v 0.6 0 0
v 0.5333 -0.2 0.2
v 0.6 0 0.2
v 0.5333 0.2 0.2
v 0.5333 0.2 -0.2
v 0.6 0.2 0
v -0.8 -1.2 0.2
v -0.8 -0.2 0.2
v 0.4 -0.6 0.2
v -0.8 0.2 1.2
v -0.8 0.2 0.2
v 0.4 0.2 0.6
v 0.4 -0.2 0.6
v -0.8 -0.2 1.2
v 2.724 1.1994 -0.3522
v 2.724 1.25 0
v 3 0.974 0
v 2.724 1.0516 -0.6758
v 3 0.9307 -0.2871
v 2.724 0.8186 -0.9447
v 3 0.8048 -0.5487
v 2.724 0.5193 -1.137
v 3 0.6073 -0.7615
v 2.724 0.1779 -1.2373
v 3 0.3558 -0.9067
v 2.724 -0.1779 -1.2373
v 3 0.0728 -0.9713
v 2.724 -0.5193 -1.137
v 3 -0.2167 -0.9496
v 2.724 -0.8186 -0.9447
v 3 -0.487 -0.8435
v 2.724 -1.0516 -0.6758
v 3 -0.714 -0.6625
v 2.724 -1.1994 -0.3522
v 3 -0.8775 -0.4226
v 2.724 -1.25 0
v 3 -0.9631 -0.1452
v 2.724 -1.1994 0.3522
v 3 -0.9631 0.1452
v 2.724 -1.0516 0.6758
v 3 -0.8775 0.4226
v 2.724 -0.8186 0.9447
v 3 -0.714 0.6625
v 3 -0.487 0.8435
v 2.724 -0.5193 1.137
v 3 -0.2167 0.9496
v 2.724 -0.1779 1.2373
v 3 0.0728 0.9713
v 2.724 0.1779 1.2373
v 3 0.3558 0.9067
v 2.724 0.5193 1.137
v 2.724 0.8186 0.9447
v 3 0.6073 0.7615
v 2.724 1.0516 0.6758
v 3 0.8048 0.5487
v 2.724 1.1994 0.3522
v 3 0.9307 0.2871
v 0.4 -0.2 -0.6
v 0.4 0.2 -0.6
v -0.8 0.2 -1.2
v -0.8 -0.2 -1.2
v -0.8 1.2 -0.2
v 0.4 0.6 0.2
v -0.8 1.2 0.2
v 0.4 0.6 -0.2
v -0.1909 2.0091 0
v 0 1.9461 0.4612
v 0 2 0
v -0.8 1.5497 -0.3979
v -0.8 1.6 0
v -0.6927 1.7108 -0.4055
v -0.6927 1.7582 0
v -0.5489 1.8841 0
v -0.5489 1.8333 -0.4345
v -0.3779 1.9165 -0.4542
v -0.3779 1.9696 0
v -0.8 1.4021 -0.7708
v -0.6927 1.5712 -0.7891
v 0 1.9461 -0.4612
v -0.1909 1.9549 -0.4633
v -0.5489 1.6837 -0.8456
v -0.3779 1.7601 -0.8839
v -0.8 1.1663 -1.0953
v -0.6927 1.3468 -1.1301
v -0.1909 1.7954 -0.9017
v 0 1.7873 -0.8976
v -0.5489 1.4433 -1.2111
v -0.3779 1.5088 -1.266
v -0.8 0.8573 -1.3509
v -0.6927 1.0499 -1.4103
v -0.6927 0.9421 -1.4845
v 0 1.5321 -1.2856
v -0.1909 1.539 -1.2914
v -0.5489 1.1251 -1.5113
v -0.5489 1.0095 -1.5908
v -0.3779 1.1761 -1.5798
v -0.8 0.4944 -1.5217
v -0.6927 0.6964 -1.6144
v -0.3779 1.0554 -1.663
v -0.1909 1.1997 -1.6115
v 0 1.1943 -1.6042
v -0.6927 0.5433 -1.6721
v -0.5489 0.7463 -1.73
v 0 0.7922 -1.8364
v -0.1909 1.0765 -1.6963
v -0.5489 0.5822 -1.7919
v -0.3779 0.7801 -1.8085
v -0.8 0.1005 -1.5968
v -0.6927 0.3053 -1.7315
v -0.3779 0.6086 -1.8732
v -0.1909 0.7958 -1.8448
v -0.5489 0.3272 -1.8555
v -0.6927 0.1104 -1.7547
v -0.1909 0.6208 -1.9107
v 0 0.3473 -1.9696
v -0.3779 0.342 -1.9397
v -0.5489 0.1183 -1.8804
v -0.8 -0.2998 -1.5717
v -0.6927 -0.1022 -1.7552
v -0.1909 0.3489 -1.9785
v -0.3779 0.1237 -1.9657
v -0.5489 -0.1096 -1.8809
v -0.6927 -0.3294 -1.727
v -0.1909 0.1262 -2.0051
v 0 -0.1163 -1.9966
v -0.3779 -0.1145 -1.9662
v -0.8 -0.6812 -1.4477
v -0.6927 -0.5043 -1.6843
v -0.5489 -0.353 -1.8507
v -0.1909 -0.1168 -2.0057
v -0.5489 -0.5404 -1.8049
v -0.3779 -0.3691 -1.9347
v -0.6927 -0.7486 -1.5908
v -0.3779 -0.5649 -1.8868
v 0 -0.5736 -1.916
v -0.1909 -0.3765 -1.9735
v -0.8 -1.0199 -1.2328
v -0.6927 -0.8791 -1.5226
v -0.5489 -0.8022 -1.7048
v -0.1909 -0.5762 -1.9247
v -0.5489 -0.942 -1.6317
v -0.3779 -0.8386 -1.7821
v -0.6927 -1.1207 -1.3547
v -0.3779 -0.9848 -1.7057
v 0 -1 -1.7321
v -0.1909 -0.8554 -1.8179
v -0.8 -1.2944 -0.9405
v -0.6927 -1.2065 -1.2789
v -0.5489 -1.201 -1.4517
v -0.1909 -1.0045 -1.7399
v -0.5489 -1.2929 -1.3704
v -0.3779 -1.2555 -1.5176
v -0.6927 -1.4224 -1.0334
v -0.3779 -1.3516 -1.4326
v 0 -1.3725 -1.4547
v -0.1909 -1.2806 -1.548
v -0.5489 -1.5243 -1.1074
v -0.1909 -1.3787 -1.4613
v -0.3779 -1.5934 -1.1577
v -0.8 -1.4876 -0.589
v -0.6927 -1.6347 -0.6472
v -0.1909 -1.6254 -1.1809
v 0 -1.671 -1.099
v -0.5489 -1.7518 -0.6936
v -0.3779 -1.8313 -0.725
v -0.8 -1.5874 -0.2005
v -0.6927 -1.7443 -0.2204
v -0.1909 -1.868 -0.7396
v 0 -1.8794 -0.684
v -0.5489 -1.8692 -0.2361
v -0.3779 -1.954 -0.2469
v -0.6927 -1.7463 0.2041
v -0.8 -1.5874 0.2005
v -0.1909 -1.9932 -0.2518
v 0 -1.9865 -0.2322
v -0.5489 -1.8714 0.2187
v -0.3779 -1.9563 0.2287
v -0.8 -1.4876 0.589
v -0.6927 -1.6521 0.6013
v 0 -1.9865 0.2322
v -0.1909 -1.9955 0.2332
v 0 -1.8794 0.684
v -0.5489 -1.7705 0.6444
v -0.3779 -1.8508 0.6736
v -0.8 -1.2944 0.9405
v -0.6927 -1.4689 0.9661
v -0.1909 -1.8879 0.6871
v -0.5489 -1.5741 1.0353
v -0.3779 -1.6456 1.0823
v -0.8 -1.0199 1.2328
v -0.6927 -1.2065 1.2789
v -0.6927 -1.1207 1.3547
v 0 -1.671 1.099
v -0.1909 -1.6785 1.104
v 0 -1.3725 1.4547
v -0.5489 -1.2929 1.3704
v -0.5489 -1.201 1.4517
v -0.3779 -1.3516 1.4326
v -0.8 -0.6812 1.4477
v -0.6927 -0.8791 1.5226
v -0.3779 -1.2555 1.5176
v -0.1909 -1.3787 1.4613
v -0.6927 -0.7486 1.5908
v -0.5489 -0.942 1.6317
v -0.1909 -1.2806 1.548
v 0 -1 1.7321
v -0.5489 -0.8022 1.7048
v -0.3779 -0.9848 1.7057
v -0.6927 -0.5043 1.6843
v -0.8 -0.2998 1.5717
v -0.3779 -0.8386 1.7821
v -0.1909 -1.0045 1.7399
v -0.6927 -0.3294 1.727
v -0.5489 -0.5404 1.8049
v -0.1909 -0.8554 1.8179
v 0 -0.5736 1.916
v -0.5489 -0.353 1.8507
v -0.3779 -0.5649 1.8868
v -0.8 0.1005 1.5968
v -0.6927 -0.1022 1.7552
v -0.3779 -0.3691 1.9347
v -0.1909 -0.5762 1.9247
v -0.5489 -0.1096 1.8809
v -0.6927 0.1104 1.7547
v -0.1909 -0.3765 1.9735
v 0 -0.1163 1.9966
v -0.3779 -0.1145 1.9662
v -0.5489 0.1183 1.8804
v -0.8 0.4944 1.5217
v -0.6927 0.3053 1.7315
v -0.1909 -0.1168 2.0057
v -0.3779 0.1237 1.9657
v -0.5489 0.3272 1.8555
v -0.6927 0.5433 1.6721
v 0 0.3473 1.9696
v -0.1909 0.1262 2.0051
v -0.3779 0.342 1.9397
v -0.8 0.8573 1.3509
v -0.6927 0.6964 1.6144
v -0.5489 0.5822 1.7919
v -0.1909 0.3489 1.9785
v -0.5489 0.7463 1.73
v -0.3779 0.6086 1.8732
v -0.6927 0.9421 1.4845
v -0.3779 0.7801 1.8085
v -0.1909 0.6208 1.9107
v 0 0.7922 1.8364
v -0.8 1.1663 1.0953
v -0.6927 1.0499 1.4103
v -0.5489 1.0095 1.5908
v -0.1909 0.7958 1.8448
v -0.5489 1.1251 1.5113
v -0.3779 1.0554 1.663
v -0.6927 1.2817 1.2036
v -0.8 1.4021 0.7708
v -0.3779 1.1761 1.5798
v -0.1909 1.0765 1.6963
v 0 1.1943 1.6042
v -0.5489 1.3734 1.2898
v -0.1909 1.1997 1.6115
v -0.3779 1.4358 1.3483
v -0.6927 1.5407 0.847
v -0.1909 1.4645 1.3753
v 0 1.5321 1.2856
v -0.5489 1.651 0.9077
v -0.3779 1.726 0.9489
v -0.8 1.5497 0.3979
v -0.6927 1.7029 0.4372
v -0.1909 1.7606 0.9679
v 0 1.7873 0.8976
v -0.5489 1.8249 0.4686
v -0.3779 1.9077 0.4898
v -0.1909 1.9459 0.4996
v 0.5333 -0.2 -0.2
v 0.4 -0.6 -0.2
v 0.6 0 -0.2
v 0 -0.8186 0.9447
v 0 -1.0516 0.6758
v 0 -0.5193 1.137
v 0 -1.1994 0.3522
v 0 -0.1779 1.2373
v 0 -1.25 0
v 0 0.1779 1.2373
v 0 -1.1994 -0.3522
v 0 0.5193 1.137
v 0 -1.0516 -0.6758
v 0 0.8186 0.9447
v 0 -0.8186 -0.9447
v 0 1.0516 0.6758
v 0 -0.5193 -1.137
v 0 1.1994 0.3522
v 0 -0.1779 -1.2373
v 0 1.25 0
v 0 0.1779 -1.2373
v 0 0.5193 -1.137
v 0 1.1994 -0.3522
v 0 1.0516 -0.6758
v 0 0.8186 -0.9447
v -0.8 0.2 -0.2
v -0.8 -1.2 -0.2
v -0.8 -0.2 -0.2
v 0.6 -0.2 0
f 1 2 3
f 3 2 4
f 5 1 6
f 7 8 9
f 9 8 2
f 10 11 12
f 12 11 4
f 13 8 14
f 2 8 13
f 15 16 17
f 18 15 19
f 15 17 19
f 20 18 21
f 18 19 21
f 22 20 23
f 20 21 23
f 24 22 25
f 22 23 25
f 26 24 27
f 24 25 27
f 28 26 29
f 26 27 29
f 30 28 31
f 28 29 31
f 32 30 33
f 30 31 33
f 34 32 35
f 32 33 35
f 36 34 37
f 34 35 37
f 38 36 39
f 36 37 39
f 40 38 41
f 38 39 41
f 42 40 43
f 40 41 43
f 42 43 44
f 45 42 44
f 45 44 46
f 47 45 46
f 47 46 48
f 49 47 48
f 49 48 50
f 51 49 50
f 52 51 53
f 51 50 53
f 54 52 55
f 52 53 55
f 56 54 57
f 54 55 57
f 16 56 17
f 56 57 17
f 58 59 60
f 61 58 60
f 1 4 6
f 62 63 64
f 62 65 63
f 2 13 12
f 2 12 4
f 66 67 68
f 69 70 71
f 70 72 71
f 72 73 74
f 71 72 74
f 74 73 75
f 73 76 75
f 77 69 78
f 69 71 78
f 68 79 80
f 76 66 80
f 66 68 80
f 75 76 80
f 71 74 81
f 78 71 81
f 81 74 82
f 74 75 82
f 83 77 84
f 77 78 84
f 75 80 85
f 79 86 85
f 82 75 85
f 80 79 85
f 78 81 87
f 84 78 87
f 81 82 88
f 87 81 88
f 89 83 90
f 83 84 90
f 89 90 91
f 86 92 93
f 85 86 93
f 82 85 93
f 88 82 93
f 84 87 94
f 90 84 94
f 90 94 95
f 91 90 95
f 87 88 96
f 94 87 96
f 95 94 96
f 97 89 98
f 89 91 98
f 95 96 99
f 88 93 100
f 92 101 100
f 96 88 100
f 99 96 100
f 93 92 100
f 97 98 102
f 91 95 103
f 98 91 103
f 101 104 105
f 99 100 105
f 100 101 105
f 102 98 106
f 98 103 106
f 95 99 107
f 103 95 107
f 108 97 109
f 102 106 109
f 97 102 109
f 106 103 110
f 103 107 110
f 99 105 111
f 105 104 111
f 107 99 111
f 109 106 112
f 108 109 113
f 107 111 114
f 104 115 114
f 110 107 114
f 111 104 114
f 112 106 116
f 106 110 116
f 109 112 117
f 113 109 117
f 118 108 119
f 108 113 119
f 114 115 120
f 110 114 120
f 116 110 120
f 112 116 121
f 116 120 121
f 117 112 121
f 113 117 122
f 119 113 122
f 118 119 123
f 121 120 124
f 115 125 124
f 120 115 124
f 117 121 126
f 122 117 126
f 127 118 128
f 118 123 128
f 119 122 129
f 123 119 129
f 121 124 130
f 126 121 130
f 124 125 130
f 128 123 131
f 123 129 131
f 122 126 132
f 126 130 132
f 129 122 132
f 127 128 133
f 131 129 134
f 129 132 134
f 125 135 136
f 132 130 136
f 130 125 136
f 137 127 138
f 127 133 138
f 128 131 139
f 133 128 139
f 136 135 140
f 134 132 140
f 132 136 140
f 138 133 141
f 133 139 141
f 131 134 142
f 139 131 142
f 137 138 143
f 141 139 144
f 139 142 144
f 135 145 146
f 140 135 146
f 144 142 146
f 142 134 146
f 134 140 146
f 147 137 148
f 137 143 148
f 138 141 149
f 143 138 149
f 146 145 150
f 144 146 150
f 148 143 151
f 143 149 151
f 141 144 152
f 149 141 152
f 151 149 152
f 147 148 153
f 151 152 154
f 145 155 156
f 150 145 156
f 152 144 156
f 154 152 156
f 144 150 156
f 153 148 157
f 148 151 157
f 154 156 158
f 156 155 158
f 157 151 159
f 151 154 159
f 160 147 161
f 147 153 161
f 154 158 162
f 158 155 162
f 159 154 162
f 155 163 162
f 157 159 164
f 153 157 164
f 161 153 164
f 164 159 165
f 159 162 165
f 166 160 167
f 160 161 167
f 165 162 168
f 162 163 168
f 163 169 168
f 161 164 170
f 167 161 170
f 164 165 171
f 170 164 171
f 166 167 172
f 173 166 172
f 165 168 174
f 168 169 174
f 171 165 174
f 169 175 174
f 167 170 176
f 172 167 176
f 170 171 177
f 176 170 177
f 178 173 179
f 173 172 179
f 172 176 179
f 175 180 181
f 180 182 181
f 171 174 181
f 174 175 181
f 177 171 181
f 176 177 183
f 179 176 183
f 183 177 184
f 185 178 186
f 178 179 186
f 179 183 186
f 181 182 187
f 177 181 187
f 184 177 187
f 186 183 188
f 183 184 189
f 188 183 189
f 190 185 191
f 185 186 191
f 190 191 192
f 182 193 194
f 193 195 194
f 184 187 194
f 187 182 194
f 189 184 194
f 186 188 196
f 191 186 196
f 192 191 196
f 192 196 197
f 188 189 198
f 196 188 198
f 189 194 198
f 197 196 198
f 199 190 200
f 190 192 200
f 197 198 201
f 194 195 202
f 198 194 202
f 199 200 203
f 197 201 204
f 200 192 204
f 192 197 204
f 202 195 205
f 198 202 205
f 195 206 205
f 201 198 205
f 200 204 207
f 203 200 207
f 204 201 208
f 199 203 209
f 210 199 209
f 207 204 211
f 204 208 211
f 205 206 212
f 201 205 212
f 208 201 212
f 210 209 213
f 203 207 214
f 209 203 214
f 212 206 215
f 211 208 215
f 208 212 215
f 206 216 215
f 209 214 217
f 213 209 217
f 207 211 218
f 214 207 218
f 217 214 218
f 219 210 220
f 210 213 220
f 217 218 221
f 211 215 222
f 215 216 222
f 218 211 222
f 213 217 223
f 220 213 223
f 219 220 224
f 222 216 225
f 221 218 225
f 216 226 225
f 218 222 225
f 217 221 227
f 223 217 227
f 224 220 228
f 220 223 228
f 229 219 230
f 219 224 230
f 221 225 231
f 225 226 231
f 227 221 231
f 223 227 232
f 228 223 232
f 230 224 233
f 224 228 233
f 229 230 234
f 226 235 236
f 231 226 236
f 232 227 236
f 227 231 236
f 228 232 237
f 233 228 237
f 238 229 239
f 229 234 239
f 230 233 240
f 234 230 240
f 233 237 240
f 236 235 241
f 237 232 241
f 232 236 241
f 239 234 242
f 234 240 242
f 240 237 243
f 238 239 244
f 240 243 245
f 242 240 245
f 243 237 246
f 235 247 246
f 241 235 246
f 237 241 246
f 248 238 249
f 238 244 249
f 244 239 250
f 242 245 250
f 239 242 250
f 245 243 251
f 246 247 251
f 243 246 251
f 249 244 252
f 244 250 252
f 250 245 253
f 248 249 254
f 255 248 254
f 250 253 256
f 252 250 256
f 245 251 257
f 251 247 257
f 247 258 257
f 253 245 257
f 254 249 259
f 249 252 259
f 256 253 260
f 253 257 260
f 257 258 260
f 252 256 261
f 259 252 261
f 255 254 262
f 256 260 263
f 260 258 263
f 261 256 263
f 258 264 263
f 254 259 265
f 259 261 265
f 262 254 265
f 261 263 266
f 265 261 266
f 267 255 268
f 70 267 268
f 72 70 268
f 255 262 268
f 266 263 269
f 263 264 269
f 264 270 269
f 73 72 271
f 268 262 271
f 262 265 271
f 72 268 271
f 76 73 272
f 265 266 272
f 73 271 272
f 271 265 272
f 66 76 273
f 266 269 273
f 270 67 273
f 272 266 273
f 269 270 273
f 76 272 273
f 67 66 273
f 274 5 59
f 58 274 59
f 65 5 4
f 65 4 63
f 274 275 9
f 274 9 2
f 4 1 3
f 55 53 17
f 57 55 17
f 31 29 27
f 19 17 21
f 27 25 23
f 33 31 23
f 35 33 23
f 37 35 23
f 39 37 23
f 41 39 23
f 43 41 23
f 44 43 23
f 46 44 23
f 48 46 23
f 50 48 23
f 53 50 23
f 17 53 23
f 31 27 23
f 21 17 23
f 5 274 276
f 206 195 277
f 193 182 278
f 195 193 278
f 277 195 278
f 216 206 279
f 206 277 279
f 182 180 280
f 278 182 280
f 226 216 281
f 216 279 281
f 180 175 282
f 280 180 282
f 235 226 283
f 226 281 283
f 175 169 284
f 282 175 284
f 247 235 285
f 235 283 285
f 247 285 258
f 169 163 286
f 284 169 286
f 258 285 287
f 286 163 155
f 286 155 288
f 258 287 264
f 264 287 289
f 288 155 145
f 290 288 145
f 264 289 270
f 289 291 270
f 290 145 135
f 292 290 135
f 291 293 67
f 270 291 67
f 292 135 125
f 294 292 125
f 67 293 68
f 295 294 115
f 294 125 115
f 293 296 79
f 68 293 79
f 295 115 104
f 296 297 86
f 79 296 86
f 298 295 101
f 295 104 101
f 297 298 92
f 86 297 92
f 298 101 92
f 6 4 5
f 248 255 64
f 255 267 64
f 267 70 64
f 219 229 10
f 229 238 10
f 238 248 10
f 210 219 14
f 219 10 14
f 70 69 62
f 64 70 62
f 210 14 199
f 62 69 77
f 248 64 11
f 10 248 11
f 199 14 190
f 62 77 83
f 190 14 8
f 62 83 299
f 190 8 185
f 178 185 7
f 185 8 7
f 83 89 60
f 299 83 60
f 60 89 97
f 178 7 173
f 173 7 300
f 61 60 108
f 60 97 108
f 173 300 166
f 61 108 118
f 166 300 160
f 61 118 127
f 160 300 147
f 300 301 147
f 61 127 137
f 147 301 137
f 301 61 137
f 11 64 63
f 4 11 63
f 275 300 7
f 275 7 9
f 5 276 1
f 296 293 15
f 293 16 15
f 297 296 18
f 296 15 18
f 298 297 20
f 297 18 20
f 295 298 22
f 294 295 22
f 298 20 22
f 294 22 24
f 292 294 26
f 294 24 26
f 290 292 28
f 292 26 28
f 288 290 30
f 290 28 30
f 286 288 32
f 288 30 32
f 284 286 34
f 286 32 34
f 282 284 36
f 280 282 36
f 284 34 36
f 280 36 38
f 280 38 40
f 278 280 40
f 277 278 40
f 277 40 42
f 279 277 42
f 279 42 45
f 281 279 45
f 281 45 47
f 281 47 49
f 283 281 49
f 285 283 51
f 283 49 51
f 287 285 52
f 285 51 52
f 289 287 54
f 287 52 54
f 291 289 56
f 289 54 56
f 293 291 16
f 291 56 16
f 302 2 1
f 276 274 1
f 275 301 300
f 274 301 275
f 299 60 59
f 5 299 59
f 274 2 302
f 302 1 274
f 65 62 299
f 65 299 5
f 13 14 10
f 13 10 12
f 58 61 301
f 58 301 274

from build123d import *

# Parameters (mm, degrees)
CUT_EXTRUDE1_DEPTH      = 0.2
CUT_EXTRUDE1_DEPTH_BACK = 0.2
CUT_EXTRUDE2_DEPTH      = 0.2
CUT_EXTRUDE2_DEPTH_BACK = 0.2


with BuildPart() as part:
    # Sketch1 → Revolve1 (revolve)
    with BuildSketch(Plane.XY):
        with BuildLine():
            Line((-0.8, 0), (-0.8, 1.6))
            ThreePointArc((-0.8, 1.6), (-0.466151956, 1.932303913), (0, 2))
            Line((0, 2), (0, 1.25))
            Line((0, 1.25), (2.724, 1.25))
            Line((2.724, 1.25), (3, 0.974))
            Line((3, 0.974), (3, 0))
            Line((3, 0), (-0.8, 0))
        make_face()
    revolve(axis=Axis((3, 0, 0), (-1, 0, 0)))

    # Sketch2 → Cut-Extrude1 (cut, two sides: drawn at the far end of the back side and taken through both)
    with BuildSketch(Plane.XY.offset(-CUT_EXTRUDE1_DEPTH_BACK)):
        Polygon((-0.8, -1.2), (0.4, -0.6), (0.6, 0), (0.4, 0.6), (-0.8, 1.2), align=None)
    extrude(amount=CUT_EXTRUDE1_DEPTH + CUT_EXTRUDE1_DEPTH_BACK, mode=Mode.SUBTRACT)

    # Sketch3 → Cut-Extrude2 (cut, two sides: drawn at the far end of the back side and taken through both)
    with BuildSketch(Plane(origin=(0, 0, 0), x_dir=(1, 0, 0), z_dir=(0, 1, 0)).offset(-CUT_EXTRUDE2_DEPTH_BACK)):
        Polygon((-0.8, -1.2), (0.4, -0.6), (0.6, 0), (0.4, 0.6), (-0.8, 1.2), align=None)
    extrude(amount=CUT_EXTRUDE2_DEPTH + CUT_EXTRUDE2_DEPTH_BACK, mode=Mode.SUBTRACT)


solid = part.part
